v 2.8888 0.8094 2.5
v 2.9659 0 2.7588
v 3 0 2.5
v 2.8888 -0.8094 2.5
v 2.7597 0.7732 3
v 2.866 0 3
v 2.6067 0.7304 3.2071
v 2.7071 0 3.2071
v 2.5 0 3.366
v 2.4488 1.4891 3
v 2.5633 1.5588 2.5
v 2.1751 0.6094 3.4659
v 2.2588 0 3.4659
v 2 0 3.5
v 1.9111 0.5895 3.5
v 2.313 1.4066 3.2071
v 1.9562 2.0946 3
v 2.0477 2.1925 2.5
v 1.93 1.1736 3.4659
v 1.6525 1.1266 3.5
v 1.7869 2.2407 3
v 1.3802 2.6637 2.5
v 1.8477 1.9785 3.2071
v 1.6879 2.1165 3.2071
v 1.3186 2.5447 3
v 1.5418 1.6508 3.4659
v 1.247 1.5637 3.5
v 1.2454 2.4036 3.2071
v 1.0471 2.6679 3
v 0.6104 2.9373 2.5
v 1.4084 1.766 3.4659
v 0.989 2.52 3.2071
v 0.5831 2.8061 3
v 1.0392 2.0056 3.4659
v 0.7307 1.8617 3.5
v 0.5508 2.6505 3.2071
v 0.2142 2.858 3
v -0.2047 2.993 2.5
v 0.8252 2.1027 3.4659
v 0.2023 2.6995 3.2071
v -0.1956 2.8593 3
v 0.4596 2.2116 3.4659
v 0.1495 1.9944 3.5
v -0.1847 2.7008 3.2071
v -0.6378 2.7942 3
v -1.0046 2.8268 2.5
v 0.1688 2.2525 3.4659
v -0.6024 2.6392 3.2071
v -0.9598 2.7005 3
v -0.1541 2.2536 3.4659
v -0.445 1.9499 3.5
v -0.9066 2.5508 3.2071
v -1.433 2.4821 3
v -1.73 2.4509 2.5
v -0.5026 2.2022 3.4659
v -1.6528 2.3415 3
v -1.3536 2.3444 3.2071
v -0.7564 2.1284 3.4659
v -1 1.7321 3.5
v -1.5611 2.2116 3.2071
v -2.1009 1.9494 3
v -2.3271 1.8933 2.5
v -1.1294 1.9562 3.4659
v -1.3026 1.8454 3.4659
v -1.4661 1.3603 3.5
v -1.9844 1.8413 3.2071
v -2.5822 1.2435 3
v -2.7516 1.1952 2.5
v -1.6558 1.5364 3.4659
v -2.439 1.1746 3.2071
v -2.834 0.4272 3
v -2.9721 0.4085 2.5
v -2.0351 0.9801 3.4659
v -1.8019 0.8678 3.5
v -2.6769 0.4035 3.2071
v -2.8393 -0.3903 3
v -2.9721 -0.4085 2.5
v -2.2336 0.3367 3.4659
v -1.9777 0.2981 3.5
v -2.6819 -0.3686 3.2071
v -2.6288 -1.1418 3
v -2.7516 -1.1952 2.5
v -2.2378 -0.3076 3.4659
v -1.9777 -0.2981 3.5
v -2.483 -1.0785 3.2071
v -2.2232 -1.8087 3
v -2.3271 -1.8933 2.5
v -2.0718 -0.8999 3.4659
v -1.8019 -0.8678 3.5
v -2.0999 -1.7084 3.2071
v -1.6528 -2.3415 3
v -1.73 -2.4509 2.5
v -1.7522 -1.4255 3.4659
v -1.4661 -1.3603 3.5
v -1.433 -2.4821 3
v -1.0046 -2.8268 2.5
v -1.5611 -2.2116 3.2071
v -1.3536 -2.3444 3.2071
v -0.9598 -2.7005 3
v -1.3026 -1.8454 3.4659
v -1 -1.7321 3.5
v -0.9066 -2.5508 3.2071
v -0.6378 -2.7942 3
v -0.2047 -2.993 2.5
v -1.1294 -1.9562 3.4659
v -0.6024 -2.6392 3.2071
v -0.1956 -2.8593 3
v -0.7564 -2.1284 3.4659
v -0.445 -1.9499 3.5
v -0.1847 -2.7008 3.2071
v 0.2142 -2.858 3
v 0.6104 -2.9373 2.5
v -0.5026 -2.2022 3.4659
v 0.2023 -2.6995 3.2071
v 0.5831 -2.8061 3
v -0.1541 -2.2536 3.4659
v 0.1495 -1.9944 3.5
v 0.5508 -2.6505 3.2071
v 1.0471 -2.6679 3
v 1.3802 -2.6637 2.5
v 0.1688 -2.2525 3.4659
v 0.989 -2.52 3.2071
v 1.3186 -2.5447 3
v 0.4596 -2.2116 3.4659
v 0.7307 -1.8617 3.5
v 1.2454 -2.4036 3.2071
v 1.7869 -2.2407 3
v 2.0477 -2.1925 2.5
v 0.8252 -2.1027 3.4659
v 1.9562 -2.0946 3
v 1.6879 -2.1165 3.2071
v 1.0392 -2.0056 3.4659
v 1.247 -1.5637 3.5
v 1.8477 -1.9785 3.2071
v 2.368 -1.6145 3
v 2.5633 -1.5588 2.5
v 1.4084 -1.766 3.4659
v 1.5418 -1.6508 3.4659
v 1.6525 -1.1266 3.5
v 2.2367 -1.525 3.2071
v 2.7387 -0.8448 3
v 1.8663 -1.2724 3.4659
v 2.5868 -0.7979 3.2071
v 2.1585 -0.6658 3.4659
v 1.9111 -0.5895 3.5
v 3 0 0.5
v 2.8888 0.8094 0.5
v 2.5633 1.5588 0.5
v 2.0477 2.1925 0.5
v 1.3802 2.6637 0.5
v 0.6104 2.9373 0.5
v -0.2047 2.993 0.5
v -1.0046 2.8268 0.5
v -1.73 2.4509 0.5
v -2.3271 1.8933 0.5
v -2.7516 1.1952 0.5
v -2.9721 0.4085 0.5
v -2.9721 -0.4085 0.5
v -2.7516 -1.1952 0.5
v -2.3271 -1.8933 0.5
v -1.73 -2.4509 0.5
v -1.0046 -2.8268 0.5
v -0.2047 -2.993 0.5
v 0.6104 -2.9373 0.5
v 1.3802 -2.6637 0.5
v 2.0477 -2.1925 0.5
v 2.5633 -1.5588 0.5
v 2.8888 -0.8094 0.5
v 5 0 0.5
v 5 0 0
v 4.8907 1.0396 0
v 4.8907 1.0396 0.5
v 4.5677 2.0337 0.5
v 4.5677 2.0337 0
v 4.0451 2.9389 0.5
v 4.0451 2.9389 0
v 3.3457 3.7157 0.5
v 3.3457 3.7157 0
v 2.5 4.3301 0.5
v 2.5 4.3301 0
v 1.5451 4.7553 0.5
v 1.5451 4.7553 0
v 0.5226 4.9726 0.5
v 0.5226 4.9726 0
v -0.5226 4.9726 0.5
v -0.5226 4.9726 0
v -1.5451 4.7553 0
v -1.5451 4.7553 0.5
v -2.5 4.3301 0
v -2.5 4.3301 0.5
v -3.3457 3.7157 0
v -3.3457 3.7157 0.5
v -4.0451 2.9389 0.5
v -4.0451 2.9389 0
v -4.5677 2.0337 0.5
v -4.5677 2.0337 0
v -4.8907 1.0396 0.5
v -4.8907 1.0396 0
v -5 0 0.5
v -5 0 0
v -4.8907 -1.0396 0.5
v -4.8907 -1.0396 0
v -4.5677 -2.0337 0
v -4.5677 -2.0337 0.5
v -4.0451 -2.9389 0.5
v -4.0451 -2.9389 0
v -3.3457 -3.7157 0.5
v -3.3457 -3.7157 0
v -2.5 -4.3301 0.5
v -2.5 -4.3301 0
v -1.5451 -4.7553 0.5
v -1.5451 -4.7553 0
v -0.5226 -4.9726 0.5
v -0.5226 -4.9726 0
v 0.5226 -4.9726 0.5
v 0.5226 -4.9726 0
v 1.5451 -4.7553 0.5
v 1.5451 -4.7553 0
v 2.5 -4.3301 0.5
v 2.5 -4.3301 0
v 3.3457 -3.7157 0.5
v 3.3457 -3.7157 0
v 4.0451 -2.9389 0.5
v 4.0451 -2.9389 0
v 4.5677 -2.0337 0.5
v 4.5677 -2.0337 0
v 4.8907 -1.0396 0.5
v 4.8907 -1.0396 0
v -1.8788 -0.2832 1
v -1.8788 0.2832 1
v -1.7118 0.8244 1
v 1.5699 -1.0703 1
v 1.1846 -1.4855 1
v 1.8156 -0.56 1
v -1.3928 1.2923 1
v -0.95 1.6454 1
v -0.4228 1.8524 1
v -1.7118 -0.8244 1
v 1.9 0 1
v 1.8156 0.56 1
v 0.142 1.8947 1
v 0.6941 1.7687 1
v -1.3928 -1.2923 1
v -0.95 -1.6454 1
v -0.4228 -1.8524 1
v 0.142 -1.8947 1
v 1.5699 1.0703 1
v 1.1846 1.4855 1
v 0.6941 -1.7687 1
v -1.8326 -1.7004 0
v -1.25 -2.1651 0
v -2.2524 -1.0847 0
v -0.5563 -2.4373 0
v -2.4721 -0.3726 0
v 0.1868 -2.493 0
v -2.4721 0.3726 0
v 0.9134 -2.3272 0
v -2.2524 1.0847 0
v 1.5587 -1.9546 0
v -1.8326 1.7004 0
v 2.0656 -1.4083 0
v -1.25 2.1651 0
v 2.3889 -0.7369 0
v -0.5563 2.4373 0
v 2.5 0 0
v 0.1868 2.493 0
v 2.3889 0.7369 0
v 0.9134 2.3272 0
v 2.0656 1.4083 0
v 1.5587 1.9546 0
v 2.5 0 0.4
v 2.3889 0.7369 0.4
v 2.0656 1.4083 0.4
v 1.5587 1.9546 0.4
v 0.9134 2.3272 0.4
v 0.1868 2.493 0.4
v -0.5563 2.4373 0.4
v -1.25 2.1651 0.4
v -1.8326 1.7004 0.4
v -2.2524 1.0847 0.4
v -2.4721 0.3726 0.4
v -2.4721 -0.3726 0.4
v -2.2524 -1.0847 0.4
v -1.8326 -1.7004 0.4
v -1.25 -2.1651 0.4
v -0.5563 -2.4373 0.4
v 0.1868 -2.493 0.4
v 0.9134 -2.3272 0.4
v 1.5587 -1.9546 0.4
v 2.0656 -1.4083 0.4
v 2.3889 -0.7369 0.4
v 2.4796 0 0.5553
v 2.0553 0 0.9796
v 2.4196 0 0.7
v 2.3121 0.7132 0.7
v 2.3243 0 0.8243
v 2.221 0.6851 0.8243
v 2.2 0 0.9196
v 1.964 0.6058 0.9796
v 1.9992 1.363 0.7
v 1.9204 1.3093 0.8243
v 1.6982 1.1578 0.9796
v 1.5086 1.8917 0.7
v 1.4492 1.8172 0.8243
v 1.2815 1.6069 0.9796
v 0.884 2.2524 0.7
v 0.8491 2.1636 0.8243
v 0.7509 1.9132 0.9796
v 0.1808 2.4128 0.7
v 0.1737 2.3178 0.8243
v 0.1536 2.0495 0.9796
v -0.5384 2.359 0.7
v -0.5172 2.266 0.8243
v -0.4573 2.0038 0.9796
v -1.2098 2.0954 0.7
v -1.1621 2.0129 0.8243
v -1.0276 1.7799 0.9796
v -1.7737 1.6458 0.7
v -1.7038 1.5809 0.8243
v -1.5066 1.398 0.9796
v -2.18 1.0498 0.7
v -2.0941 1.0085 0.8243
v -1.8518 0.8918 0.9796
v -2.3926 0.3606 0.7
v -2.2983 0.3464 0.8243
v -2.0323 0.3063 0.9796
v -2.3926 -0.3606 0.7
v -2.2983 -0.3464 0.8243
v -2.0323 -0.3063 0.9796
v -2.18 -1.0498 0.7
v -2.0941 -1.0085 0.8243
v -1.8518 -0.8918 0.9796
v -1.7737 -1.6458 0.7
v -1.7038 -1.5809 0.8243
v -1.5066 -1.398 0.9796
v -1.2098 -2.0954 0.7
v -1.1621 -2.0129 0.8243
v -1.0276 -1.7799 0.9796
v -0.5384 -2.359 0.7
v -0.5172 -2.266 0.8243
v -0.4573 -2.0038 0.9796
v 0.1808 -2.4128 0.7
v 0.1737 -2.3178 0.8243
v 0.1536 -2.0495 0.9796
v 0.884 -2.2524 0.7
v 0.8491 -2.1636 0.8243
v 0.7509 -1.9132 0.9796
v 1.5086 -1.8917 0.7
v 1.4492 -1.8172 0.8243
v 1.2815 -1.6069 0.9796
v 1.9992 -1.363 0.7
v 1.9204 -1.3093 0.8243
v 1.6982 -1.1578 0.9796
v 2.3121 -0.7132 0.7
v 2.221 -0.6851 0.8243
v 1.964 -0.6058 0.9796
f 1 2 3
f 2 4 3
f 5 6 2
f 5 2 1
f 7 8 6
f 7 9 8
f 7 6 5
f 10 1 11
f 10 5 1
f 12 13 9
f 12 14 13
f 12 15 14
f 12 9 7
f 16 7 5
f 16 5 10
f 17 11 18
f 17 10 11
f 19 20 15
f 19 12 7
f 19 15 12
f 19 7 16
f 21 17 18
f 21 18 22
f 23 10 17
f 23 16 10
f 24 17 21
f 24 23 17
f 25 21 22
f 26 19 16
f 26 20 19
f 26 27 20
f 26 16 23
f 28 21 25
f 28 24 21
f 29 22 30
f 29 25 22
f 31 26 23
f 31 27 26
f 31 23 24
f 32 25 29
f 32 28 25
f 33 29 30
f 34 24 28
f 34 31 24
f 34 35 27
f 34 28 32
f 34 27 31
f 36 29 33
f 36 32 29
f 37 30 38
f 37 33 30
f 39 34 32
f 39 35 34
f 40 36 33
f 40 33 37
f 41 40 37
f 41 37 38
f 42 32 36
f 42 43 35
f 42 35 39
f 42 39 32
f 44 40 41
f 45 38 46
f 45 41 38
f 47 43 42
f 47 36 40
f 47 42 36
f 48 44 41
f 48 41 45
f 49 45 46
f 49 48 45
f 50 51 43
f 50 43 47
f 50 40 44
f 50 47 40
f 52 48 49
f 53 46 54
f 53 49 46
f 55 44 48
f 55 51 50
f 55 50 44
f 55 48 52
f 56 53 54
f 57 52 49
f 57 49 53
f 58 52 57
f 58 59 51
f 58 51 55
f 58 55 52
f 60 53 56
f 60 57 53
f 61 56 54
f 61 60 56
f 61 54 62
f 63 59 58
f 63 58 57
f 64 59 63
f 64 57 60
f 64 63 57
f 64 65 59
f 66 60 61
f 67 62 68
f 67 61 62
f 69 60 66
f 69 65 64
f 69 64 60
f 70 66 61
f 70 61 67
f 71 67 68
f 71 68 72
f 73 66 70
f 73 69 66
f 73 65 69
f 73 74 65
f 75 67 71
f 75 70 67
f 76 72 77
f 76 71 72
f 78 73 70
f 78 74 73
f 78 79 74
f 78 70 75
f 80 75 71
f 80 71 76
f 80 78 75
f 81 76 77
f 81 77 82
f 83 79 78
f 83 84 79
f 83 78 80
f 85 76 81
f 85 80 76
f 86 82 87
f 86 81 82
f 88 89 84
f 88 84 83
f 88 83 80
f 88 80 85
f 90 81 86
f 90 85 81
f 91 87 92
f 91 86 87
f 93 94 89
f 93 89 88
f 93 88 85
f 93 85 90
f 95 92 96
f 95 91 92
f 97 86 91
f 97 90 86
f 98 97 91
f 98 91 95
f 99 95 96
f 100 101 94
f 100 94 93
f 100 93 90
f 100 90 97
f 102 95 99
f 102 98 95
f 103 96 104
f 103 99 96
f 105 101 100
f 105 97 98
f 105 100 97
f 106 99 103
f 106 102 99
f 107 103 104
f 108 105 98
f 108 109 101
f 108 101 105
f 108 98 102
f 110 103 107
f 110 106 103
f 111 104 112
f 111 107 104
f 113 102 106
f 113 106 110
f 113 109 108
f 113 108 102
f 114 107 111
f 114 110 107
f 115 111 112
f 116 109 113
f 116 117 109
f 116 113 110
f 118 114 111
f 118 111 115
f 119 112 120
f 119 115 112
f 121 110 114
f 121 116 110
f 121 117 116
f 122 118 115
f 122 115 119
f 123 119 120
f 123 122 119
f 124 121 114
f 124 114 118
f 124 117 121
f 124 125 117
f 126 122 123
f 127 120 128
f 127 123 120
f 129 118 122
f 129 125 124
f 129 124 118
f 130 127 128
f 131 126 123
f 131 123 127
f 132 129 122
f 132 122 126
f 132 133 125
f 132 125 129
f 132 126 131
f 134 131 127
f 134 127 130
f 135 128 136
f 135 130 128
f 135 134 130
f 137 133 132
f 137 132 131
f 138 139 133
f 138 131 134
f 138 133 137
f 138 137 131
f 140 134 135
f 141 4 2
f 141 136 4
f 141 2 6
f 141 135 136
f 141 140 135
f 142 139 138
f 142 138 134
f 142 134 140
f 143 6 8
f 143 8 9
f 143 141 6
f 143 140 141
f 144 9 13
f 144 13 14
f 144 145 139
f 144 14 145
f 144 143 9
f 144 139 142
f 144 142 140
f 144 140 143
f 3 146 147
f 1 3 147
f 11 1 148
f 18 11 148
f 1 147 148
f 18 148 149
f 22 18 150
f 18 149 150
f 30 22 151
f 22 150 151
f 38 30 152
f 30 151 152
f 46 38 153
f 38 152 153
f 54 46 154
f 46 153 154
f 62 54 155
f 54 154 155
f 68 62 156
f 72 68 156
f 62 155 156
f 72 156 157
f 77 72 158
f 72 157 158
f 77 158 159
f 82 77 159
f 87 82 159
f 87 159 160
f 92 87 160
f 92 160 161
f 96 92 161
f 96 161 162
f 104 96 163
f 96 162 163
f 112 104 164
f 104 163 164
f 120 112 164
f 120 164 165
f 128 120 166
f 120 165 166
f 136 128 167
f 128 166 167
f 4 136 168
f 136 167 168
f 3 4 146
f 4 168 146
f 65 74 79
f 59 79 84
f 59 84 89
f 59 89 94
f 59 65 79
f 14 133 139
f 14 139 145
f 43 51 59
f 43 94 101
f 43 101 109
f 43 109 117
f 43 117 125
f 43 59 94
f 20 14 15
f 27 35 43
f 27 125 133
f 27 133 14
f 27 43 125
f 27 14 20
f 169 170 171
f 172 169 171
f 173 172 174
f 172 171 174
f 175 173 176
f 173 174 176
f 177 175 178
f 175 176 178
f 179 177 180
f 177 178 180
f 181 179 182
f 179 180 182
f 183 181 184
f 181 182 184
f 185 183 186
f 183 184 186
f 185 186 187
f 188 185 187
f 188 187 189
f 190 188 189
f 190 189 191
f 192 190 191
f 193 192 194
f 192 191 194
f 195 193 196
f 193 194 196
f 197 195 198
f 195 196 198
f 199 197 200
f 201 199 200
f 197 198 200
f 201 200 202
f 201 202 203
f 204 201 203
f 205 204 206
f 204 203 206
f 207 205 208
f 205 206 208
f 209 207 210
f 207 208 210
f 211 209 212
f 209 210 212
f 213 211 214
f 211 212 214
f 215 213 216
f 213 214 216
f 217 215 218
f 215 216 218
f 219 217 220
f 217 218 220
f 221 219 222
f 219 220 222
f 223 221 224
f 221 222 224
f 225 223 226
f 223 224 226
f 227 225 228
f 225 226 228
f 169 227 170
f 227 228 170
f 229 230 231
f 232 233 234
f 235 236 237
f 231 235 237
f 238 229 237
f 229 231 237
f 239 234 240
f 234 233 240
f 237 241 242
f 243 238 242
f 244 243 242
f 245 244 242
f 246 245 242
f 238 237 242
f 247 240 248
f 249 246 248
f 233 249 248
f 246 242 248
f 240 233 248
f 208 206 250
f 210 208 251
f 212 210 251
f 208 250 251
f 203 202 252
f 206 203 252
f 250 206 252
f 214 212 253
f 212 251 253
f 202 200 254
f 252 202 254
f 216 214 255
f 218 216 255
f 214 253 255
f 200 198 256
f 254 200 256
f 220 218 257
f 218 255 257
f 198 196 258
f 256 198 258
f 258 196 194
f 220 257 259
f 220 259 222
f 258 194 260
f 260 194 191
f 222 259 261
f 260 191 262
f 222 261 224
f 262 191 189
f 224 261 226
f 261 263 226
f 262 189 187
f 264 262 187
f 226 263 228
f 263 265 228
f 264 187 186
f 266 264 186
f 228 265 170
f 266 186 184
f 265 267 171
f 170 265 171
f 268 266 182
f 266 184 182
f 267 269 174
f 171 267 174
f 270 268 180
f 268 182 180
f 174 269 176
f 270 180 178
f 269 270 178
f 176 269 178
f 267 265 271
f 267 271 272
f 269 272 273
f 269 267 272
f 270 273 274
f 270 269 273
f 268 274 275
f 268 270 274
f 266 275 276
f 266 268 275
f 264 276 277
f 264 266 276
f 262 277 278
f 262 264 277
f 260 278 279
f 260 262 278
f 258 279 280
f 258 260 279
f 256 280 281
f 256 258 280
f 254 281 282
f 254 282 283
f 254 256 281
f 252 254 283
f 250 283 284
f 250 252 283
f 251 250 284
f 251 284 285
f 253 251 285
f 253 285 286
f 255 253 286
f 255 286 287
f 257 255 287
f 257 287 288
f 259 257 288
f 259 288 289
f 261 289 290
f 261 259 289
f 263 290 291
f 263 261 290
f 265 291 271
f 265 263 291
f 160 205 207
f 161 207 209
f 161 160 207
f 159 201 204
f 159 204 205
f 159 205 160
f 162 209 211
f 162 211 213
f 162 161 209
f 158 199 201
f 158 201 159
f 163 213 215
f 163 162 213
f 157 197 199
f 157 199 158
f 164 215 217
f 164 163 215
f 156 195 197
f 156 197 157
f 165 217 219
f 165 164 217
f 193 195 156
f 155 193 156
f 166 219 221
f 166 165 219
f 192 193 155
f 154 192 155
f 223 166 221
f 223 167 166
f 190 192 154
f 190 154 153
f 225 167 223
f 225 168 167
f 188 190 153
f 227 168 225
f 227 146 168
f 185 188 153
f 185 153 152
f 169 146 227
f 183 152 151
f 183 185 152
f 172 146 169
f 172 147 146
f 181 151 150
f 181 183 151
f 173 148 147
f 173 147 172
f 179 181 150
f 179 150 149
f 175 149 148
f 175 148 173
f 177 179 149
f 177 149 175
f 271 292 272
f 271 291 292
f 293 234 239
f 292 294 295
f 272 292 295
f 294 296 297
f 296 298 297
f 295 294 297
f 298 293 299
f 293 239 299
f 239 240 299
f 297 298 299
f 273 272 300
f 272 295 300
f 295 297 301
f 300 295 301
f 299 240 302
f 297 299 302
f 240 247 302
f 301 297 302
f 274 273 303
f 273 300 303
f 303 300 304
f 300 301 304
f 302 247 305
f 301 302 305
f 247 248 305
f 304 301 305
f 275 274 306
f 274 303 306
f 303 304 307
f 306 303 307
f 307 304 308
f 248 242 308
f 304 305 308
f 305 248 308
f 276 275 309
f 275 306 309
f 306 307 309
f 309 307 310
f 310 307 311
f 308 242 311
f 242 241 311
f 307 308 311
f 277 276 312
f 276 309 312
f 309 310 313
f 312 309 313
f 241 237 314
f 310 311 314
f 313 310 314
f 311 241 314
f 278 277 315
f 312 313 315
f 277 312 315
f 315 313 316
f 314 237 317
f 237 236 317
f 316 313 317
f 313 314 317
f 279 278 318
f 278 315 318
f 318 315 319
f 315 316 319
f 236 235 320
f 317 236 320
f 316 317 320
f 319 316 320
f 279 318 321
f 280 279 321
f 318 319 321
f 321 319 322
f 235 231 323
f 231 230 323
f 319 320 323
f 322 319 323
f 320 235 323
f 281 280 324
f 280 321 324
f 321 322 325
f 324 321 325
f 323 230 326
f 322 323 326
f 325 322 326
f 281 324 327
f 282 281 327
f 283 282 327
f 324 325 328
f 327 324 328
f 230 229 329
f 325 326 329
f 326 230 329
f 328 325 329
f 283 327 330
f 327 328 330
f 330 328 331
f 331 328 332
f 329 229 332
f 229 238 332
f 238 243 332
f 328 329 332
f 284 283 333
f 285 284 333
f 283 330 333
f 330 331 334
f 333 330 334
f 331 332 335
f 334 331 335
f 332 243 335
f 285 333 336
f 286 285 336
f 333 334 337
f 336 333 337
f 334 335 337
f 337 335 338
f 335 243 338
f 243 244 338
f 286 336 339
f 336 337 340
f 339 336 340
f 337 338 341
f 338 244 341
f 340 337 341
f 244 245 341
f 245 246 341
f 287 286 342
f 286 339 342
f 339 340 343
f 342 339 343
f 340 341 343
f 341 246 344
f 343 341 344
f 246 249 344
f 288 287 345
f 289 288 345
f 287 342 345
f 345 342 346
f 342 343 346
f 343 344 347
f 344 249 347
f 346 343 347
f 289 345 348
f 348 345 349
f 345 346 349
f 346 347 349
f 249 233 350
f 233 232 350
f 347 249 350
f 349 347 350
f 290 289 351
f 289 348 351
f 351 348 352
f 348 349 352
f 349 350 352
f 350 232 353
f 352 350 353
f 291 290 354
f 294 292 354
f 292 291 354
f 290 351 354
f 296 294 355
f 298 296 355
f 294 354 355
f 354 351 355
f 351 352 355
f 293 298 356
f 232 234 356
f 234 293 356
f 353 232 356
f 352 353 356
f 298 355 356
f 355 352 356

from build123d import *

# Parameters (mm, degrees)
SKETCH026_R     = 5
PAD015_DEPTH    = 0.5
SKETCH027_R     = 3
PAD016_DEPTH    = 3
FILLET003_R     = 1
SKETCH028_R     = 2.5
POCKET011_DEPTH = 1
FILLET004_R     = 0.6


with BuildPart() as part:
    # Sketch026 (on XY_Plane005 of Origin010) → Pad015 (new body)
    with BuildSketch(Plane.XY):
        Circle(SKETCH026_R)
    extrude(amount=PAD015_DEPTH)

    # Sketch027 (on Face3 of Pad015) → Pad016 (join)
    with BuildSketch(Plane.XY.offset(0.5)):
        Circle(SKETCH027_R)
    extrude(amount=PAD016_DEPTH)

    # Fillet003
    fillet003_edges = [part.edges().sort_by_distance(p)[0] for p in [
        (-3, 0, 3.5),
    ]]
    fillet(fillet003_edges, radius=FILLET003_R)

    # Sketch028 → Pocket011 (cut)
    with BuildSketch(Plane.XY):
        Circle(SKETCH028_R)
    extrude(amount=POCKET011_DEPTH, mode=Mode.SUBTRACT)

    # Fillet004
    fillet004_edges = [part.edges().sort_by_distance(p)[0] for p in [
        (-2.5, 0, 1),
    ]]
    fillet(fillet004_edges, radius=FILLET004_R)


solid = part.part
